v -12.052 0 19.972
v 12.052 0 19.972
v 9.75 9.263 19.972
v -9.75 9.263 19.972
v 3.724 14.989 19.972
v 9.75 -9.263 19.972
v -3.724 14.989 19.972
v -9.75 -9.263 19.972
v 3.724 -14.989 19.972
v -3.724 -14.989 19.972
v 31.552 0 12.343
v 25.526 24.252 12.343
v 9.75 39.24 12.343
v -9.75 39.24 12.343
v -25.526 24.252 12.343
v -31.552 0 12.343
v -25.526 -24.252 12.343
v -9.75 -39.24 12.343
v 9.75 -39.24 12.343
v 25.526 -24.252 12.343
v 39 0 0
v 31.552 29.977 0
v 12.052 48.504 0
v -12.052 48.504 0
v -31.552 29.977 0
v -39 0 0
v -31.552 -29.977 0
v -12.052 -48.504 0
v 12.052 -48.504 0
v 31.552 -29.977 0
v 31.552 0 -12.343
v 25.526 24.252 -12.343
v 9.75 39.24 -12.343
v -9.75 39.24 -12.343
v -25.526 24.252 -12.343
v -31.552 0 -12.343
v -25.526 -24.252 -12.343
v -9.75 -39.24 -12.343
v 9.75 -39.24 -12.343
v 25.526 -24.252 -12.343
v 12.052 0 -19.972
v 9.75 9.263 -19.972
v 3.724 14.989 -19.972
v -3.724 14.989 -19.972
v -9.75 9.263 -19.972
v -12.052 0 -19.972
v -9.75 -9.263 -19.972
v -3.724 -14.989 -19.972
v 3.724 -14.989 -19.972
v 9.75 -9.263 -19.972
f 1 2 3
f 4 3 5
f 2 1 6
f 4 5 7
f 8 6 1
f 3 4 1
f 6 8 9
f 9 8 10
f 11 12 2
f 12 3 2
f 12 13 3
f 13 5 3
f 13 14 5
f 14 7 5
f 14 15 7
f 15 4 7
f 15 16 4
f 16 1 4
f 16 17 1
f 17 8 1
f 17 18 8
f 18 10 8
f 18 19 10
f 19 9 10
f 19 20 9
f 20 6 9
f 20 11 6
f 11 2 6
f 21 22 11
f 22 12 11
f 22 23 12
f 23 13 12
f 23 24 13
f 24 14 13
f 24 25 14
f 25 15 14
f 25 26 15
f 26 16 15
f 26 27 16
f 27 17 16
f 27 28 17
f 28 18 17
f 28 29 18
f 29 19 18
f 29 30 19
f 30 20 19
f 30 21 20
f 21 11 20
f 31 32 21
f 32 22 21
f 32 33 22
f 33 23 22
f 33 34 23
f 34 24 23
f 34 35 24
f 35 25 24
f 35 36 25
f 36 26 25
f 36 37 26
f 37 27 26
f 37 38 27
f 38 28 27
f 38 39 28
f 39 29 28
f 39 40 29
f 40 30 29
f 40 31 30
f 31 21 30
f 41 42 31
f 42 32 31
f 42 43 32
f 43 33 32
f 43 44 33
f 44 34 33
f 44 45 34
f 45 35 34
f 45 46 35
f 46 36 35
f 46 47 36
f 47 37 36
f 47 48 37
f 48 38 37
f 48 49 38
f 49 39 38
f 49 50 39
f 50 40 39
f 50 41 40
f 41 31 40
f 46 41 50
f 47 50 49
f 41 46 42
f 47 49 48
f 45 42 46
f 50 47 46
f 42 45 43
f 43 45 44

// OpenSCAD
// Generated by SolidPython 1.0.1 on 2020-07-29 00:46:51


scale(v = [13, 17, 7]) {
	sphere(r = 3);
}
/***********************************************
*********      SolidPython code:      **********
************************************************
 
# import packages: SolidPython
from solid import *
from solid.utils import *
from itertools import chain, combinations, permutations


class Resize:

    def __init__(self, scad_file):
        self.scad_file = scad_file
        #self.scad_file = import_scad(scad_file)
        # cone/cylinder param:
        self.r1 = 0
        self.r2 = 0
        self.h = 0
        # rectangular prism param:
        self.w = 0
        self.l = 0
        # ellipse param:
        self.r = 0

    # import OpenScad code (file name corresponds to shape)


    # classify shape + parameters
    def assign(self, param1, param2, param3):
        if self.scad_file == 'cone.scad':
            self.r1 = param1
            self.r2 = param2
            self.h = param3
        elif self.scad_file == 'cylinder.scad':
            self.r1 = param1
            self.r2 = param2
            self.h = param3
        elif self.scad_file == 'rectangularPrism.scad':
            self.h = param1
            self.l = param2
            self.w = param3
        else:
            self.r = param1
            self.h = param2

    # resize parameters
    def iterate(self):
        x = range(3, 20, 2)
        i = 1
        if self.scad_file == 'cone.scad':
            tempList = list(permutations(x, 2))
            for temp in tempList:
                param1 = temp[0]
                param2 = temp[1]
                filepath = 'produced_scad_files/' + 'cone' + str(param1) + '_' + str(param2) + '_' + '.scad'
                scad_render_to_file(cylinder(h=param1, r1=param2, r2=0), filepath)

        elif self.scad_file == 'cylinder.scad':
            tempList = list(permutations(x, 3))
            for temp in tempList:
                param1 = temp[0]
                param2 = temp[1]
                filepath = 'produced_scad_files/' + 'cylinder' + str(param1) + '_' + str(param2) + '_' + '.scad'
                scad_render_to_file(cylinder(h=param1, r1=param2, r2=param2), filepath)

        elif self.scad_file == 'rectangularPrism.scad':
            tempList = list(permutations(x, 3))
            for temp in tempList:
                param1 = temp[0]
                param2 = temp[1]
                param3 = temp[2]
                filepath = 'produced_scad_files/' + 'rectangularPrism' + str(param1) + '_' + str(param2) + '_' + str(
                    param3) + '.scad'
                scad_render_to_file(cube(size=(param1, param2, param3)), filepath)

        elif self.scad_file == 'ellipse.scad':
            tempList = list(permutations(x, 4))
            for temp in tempList:
                param1 = temp[0]
                param2 = temp[1]
                param3 = temp[2]
                param4 = temp[3]
                filepath = 'produced_scad_files/' + 'ellipse' + str(param1) + '_' + str(param2) + '_' + str(param3) + '_' + str(param4) + '.scad'
                scad_render_to_file(scale([param1, param2, param3])(sphere(r=param4)), filepath)

    def render_to_scadfile(self):
        scad_render_to_file(scad, 'example.scad') 
 
************************************************/
